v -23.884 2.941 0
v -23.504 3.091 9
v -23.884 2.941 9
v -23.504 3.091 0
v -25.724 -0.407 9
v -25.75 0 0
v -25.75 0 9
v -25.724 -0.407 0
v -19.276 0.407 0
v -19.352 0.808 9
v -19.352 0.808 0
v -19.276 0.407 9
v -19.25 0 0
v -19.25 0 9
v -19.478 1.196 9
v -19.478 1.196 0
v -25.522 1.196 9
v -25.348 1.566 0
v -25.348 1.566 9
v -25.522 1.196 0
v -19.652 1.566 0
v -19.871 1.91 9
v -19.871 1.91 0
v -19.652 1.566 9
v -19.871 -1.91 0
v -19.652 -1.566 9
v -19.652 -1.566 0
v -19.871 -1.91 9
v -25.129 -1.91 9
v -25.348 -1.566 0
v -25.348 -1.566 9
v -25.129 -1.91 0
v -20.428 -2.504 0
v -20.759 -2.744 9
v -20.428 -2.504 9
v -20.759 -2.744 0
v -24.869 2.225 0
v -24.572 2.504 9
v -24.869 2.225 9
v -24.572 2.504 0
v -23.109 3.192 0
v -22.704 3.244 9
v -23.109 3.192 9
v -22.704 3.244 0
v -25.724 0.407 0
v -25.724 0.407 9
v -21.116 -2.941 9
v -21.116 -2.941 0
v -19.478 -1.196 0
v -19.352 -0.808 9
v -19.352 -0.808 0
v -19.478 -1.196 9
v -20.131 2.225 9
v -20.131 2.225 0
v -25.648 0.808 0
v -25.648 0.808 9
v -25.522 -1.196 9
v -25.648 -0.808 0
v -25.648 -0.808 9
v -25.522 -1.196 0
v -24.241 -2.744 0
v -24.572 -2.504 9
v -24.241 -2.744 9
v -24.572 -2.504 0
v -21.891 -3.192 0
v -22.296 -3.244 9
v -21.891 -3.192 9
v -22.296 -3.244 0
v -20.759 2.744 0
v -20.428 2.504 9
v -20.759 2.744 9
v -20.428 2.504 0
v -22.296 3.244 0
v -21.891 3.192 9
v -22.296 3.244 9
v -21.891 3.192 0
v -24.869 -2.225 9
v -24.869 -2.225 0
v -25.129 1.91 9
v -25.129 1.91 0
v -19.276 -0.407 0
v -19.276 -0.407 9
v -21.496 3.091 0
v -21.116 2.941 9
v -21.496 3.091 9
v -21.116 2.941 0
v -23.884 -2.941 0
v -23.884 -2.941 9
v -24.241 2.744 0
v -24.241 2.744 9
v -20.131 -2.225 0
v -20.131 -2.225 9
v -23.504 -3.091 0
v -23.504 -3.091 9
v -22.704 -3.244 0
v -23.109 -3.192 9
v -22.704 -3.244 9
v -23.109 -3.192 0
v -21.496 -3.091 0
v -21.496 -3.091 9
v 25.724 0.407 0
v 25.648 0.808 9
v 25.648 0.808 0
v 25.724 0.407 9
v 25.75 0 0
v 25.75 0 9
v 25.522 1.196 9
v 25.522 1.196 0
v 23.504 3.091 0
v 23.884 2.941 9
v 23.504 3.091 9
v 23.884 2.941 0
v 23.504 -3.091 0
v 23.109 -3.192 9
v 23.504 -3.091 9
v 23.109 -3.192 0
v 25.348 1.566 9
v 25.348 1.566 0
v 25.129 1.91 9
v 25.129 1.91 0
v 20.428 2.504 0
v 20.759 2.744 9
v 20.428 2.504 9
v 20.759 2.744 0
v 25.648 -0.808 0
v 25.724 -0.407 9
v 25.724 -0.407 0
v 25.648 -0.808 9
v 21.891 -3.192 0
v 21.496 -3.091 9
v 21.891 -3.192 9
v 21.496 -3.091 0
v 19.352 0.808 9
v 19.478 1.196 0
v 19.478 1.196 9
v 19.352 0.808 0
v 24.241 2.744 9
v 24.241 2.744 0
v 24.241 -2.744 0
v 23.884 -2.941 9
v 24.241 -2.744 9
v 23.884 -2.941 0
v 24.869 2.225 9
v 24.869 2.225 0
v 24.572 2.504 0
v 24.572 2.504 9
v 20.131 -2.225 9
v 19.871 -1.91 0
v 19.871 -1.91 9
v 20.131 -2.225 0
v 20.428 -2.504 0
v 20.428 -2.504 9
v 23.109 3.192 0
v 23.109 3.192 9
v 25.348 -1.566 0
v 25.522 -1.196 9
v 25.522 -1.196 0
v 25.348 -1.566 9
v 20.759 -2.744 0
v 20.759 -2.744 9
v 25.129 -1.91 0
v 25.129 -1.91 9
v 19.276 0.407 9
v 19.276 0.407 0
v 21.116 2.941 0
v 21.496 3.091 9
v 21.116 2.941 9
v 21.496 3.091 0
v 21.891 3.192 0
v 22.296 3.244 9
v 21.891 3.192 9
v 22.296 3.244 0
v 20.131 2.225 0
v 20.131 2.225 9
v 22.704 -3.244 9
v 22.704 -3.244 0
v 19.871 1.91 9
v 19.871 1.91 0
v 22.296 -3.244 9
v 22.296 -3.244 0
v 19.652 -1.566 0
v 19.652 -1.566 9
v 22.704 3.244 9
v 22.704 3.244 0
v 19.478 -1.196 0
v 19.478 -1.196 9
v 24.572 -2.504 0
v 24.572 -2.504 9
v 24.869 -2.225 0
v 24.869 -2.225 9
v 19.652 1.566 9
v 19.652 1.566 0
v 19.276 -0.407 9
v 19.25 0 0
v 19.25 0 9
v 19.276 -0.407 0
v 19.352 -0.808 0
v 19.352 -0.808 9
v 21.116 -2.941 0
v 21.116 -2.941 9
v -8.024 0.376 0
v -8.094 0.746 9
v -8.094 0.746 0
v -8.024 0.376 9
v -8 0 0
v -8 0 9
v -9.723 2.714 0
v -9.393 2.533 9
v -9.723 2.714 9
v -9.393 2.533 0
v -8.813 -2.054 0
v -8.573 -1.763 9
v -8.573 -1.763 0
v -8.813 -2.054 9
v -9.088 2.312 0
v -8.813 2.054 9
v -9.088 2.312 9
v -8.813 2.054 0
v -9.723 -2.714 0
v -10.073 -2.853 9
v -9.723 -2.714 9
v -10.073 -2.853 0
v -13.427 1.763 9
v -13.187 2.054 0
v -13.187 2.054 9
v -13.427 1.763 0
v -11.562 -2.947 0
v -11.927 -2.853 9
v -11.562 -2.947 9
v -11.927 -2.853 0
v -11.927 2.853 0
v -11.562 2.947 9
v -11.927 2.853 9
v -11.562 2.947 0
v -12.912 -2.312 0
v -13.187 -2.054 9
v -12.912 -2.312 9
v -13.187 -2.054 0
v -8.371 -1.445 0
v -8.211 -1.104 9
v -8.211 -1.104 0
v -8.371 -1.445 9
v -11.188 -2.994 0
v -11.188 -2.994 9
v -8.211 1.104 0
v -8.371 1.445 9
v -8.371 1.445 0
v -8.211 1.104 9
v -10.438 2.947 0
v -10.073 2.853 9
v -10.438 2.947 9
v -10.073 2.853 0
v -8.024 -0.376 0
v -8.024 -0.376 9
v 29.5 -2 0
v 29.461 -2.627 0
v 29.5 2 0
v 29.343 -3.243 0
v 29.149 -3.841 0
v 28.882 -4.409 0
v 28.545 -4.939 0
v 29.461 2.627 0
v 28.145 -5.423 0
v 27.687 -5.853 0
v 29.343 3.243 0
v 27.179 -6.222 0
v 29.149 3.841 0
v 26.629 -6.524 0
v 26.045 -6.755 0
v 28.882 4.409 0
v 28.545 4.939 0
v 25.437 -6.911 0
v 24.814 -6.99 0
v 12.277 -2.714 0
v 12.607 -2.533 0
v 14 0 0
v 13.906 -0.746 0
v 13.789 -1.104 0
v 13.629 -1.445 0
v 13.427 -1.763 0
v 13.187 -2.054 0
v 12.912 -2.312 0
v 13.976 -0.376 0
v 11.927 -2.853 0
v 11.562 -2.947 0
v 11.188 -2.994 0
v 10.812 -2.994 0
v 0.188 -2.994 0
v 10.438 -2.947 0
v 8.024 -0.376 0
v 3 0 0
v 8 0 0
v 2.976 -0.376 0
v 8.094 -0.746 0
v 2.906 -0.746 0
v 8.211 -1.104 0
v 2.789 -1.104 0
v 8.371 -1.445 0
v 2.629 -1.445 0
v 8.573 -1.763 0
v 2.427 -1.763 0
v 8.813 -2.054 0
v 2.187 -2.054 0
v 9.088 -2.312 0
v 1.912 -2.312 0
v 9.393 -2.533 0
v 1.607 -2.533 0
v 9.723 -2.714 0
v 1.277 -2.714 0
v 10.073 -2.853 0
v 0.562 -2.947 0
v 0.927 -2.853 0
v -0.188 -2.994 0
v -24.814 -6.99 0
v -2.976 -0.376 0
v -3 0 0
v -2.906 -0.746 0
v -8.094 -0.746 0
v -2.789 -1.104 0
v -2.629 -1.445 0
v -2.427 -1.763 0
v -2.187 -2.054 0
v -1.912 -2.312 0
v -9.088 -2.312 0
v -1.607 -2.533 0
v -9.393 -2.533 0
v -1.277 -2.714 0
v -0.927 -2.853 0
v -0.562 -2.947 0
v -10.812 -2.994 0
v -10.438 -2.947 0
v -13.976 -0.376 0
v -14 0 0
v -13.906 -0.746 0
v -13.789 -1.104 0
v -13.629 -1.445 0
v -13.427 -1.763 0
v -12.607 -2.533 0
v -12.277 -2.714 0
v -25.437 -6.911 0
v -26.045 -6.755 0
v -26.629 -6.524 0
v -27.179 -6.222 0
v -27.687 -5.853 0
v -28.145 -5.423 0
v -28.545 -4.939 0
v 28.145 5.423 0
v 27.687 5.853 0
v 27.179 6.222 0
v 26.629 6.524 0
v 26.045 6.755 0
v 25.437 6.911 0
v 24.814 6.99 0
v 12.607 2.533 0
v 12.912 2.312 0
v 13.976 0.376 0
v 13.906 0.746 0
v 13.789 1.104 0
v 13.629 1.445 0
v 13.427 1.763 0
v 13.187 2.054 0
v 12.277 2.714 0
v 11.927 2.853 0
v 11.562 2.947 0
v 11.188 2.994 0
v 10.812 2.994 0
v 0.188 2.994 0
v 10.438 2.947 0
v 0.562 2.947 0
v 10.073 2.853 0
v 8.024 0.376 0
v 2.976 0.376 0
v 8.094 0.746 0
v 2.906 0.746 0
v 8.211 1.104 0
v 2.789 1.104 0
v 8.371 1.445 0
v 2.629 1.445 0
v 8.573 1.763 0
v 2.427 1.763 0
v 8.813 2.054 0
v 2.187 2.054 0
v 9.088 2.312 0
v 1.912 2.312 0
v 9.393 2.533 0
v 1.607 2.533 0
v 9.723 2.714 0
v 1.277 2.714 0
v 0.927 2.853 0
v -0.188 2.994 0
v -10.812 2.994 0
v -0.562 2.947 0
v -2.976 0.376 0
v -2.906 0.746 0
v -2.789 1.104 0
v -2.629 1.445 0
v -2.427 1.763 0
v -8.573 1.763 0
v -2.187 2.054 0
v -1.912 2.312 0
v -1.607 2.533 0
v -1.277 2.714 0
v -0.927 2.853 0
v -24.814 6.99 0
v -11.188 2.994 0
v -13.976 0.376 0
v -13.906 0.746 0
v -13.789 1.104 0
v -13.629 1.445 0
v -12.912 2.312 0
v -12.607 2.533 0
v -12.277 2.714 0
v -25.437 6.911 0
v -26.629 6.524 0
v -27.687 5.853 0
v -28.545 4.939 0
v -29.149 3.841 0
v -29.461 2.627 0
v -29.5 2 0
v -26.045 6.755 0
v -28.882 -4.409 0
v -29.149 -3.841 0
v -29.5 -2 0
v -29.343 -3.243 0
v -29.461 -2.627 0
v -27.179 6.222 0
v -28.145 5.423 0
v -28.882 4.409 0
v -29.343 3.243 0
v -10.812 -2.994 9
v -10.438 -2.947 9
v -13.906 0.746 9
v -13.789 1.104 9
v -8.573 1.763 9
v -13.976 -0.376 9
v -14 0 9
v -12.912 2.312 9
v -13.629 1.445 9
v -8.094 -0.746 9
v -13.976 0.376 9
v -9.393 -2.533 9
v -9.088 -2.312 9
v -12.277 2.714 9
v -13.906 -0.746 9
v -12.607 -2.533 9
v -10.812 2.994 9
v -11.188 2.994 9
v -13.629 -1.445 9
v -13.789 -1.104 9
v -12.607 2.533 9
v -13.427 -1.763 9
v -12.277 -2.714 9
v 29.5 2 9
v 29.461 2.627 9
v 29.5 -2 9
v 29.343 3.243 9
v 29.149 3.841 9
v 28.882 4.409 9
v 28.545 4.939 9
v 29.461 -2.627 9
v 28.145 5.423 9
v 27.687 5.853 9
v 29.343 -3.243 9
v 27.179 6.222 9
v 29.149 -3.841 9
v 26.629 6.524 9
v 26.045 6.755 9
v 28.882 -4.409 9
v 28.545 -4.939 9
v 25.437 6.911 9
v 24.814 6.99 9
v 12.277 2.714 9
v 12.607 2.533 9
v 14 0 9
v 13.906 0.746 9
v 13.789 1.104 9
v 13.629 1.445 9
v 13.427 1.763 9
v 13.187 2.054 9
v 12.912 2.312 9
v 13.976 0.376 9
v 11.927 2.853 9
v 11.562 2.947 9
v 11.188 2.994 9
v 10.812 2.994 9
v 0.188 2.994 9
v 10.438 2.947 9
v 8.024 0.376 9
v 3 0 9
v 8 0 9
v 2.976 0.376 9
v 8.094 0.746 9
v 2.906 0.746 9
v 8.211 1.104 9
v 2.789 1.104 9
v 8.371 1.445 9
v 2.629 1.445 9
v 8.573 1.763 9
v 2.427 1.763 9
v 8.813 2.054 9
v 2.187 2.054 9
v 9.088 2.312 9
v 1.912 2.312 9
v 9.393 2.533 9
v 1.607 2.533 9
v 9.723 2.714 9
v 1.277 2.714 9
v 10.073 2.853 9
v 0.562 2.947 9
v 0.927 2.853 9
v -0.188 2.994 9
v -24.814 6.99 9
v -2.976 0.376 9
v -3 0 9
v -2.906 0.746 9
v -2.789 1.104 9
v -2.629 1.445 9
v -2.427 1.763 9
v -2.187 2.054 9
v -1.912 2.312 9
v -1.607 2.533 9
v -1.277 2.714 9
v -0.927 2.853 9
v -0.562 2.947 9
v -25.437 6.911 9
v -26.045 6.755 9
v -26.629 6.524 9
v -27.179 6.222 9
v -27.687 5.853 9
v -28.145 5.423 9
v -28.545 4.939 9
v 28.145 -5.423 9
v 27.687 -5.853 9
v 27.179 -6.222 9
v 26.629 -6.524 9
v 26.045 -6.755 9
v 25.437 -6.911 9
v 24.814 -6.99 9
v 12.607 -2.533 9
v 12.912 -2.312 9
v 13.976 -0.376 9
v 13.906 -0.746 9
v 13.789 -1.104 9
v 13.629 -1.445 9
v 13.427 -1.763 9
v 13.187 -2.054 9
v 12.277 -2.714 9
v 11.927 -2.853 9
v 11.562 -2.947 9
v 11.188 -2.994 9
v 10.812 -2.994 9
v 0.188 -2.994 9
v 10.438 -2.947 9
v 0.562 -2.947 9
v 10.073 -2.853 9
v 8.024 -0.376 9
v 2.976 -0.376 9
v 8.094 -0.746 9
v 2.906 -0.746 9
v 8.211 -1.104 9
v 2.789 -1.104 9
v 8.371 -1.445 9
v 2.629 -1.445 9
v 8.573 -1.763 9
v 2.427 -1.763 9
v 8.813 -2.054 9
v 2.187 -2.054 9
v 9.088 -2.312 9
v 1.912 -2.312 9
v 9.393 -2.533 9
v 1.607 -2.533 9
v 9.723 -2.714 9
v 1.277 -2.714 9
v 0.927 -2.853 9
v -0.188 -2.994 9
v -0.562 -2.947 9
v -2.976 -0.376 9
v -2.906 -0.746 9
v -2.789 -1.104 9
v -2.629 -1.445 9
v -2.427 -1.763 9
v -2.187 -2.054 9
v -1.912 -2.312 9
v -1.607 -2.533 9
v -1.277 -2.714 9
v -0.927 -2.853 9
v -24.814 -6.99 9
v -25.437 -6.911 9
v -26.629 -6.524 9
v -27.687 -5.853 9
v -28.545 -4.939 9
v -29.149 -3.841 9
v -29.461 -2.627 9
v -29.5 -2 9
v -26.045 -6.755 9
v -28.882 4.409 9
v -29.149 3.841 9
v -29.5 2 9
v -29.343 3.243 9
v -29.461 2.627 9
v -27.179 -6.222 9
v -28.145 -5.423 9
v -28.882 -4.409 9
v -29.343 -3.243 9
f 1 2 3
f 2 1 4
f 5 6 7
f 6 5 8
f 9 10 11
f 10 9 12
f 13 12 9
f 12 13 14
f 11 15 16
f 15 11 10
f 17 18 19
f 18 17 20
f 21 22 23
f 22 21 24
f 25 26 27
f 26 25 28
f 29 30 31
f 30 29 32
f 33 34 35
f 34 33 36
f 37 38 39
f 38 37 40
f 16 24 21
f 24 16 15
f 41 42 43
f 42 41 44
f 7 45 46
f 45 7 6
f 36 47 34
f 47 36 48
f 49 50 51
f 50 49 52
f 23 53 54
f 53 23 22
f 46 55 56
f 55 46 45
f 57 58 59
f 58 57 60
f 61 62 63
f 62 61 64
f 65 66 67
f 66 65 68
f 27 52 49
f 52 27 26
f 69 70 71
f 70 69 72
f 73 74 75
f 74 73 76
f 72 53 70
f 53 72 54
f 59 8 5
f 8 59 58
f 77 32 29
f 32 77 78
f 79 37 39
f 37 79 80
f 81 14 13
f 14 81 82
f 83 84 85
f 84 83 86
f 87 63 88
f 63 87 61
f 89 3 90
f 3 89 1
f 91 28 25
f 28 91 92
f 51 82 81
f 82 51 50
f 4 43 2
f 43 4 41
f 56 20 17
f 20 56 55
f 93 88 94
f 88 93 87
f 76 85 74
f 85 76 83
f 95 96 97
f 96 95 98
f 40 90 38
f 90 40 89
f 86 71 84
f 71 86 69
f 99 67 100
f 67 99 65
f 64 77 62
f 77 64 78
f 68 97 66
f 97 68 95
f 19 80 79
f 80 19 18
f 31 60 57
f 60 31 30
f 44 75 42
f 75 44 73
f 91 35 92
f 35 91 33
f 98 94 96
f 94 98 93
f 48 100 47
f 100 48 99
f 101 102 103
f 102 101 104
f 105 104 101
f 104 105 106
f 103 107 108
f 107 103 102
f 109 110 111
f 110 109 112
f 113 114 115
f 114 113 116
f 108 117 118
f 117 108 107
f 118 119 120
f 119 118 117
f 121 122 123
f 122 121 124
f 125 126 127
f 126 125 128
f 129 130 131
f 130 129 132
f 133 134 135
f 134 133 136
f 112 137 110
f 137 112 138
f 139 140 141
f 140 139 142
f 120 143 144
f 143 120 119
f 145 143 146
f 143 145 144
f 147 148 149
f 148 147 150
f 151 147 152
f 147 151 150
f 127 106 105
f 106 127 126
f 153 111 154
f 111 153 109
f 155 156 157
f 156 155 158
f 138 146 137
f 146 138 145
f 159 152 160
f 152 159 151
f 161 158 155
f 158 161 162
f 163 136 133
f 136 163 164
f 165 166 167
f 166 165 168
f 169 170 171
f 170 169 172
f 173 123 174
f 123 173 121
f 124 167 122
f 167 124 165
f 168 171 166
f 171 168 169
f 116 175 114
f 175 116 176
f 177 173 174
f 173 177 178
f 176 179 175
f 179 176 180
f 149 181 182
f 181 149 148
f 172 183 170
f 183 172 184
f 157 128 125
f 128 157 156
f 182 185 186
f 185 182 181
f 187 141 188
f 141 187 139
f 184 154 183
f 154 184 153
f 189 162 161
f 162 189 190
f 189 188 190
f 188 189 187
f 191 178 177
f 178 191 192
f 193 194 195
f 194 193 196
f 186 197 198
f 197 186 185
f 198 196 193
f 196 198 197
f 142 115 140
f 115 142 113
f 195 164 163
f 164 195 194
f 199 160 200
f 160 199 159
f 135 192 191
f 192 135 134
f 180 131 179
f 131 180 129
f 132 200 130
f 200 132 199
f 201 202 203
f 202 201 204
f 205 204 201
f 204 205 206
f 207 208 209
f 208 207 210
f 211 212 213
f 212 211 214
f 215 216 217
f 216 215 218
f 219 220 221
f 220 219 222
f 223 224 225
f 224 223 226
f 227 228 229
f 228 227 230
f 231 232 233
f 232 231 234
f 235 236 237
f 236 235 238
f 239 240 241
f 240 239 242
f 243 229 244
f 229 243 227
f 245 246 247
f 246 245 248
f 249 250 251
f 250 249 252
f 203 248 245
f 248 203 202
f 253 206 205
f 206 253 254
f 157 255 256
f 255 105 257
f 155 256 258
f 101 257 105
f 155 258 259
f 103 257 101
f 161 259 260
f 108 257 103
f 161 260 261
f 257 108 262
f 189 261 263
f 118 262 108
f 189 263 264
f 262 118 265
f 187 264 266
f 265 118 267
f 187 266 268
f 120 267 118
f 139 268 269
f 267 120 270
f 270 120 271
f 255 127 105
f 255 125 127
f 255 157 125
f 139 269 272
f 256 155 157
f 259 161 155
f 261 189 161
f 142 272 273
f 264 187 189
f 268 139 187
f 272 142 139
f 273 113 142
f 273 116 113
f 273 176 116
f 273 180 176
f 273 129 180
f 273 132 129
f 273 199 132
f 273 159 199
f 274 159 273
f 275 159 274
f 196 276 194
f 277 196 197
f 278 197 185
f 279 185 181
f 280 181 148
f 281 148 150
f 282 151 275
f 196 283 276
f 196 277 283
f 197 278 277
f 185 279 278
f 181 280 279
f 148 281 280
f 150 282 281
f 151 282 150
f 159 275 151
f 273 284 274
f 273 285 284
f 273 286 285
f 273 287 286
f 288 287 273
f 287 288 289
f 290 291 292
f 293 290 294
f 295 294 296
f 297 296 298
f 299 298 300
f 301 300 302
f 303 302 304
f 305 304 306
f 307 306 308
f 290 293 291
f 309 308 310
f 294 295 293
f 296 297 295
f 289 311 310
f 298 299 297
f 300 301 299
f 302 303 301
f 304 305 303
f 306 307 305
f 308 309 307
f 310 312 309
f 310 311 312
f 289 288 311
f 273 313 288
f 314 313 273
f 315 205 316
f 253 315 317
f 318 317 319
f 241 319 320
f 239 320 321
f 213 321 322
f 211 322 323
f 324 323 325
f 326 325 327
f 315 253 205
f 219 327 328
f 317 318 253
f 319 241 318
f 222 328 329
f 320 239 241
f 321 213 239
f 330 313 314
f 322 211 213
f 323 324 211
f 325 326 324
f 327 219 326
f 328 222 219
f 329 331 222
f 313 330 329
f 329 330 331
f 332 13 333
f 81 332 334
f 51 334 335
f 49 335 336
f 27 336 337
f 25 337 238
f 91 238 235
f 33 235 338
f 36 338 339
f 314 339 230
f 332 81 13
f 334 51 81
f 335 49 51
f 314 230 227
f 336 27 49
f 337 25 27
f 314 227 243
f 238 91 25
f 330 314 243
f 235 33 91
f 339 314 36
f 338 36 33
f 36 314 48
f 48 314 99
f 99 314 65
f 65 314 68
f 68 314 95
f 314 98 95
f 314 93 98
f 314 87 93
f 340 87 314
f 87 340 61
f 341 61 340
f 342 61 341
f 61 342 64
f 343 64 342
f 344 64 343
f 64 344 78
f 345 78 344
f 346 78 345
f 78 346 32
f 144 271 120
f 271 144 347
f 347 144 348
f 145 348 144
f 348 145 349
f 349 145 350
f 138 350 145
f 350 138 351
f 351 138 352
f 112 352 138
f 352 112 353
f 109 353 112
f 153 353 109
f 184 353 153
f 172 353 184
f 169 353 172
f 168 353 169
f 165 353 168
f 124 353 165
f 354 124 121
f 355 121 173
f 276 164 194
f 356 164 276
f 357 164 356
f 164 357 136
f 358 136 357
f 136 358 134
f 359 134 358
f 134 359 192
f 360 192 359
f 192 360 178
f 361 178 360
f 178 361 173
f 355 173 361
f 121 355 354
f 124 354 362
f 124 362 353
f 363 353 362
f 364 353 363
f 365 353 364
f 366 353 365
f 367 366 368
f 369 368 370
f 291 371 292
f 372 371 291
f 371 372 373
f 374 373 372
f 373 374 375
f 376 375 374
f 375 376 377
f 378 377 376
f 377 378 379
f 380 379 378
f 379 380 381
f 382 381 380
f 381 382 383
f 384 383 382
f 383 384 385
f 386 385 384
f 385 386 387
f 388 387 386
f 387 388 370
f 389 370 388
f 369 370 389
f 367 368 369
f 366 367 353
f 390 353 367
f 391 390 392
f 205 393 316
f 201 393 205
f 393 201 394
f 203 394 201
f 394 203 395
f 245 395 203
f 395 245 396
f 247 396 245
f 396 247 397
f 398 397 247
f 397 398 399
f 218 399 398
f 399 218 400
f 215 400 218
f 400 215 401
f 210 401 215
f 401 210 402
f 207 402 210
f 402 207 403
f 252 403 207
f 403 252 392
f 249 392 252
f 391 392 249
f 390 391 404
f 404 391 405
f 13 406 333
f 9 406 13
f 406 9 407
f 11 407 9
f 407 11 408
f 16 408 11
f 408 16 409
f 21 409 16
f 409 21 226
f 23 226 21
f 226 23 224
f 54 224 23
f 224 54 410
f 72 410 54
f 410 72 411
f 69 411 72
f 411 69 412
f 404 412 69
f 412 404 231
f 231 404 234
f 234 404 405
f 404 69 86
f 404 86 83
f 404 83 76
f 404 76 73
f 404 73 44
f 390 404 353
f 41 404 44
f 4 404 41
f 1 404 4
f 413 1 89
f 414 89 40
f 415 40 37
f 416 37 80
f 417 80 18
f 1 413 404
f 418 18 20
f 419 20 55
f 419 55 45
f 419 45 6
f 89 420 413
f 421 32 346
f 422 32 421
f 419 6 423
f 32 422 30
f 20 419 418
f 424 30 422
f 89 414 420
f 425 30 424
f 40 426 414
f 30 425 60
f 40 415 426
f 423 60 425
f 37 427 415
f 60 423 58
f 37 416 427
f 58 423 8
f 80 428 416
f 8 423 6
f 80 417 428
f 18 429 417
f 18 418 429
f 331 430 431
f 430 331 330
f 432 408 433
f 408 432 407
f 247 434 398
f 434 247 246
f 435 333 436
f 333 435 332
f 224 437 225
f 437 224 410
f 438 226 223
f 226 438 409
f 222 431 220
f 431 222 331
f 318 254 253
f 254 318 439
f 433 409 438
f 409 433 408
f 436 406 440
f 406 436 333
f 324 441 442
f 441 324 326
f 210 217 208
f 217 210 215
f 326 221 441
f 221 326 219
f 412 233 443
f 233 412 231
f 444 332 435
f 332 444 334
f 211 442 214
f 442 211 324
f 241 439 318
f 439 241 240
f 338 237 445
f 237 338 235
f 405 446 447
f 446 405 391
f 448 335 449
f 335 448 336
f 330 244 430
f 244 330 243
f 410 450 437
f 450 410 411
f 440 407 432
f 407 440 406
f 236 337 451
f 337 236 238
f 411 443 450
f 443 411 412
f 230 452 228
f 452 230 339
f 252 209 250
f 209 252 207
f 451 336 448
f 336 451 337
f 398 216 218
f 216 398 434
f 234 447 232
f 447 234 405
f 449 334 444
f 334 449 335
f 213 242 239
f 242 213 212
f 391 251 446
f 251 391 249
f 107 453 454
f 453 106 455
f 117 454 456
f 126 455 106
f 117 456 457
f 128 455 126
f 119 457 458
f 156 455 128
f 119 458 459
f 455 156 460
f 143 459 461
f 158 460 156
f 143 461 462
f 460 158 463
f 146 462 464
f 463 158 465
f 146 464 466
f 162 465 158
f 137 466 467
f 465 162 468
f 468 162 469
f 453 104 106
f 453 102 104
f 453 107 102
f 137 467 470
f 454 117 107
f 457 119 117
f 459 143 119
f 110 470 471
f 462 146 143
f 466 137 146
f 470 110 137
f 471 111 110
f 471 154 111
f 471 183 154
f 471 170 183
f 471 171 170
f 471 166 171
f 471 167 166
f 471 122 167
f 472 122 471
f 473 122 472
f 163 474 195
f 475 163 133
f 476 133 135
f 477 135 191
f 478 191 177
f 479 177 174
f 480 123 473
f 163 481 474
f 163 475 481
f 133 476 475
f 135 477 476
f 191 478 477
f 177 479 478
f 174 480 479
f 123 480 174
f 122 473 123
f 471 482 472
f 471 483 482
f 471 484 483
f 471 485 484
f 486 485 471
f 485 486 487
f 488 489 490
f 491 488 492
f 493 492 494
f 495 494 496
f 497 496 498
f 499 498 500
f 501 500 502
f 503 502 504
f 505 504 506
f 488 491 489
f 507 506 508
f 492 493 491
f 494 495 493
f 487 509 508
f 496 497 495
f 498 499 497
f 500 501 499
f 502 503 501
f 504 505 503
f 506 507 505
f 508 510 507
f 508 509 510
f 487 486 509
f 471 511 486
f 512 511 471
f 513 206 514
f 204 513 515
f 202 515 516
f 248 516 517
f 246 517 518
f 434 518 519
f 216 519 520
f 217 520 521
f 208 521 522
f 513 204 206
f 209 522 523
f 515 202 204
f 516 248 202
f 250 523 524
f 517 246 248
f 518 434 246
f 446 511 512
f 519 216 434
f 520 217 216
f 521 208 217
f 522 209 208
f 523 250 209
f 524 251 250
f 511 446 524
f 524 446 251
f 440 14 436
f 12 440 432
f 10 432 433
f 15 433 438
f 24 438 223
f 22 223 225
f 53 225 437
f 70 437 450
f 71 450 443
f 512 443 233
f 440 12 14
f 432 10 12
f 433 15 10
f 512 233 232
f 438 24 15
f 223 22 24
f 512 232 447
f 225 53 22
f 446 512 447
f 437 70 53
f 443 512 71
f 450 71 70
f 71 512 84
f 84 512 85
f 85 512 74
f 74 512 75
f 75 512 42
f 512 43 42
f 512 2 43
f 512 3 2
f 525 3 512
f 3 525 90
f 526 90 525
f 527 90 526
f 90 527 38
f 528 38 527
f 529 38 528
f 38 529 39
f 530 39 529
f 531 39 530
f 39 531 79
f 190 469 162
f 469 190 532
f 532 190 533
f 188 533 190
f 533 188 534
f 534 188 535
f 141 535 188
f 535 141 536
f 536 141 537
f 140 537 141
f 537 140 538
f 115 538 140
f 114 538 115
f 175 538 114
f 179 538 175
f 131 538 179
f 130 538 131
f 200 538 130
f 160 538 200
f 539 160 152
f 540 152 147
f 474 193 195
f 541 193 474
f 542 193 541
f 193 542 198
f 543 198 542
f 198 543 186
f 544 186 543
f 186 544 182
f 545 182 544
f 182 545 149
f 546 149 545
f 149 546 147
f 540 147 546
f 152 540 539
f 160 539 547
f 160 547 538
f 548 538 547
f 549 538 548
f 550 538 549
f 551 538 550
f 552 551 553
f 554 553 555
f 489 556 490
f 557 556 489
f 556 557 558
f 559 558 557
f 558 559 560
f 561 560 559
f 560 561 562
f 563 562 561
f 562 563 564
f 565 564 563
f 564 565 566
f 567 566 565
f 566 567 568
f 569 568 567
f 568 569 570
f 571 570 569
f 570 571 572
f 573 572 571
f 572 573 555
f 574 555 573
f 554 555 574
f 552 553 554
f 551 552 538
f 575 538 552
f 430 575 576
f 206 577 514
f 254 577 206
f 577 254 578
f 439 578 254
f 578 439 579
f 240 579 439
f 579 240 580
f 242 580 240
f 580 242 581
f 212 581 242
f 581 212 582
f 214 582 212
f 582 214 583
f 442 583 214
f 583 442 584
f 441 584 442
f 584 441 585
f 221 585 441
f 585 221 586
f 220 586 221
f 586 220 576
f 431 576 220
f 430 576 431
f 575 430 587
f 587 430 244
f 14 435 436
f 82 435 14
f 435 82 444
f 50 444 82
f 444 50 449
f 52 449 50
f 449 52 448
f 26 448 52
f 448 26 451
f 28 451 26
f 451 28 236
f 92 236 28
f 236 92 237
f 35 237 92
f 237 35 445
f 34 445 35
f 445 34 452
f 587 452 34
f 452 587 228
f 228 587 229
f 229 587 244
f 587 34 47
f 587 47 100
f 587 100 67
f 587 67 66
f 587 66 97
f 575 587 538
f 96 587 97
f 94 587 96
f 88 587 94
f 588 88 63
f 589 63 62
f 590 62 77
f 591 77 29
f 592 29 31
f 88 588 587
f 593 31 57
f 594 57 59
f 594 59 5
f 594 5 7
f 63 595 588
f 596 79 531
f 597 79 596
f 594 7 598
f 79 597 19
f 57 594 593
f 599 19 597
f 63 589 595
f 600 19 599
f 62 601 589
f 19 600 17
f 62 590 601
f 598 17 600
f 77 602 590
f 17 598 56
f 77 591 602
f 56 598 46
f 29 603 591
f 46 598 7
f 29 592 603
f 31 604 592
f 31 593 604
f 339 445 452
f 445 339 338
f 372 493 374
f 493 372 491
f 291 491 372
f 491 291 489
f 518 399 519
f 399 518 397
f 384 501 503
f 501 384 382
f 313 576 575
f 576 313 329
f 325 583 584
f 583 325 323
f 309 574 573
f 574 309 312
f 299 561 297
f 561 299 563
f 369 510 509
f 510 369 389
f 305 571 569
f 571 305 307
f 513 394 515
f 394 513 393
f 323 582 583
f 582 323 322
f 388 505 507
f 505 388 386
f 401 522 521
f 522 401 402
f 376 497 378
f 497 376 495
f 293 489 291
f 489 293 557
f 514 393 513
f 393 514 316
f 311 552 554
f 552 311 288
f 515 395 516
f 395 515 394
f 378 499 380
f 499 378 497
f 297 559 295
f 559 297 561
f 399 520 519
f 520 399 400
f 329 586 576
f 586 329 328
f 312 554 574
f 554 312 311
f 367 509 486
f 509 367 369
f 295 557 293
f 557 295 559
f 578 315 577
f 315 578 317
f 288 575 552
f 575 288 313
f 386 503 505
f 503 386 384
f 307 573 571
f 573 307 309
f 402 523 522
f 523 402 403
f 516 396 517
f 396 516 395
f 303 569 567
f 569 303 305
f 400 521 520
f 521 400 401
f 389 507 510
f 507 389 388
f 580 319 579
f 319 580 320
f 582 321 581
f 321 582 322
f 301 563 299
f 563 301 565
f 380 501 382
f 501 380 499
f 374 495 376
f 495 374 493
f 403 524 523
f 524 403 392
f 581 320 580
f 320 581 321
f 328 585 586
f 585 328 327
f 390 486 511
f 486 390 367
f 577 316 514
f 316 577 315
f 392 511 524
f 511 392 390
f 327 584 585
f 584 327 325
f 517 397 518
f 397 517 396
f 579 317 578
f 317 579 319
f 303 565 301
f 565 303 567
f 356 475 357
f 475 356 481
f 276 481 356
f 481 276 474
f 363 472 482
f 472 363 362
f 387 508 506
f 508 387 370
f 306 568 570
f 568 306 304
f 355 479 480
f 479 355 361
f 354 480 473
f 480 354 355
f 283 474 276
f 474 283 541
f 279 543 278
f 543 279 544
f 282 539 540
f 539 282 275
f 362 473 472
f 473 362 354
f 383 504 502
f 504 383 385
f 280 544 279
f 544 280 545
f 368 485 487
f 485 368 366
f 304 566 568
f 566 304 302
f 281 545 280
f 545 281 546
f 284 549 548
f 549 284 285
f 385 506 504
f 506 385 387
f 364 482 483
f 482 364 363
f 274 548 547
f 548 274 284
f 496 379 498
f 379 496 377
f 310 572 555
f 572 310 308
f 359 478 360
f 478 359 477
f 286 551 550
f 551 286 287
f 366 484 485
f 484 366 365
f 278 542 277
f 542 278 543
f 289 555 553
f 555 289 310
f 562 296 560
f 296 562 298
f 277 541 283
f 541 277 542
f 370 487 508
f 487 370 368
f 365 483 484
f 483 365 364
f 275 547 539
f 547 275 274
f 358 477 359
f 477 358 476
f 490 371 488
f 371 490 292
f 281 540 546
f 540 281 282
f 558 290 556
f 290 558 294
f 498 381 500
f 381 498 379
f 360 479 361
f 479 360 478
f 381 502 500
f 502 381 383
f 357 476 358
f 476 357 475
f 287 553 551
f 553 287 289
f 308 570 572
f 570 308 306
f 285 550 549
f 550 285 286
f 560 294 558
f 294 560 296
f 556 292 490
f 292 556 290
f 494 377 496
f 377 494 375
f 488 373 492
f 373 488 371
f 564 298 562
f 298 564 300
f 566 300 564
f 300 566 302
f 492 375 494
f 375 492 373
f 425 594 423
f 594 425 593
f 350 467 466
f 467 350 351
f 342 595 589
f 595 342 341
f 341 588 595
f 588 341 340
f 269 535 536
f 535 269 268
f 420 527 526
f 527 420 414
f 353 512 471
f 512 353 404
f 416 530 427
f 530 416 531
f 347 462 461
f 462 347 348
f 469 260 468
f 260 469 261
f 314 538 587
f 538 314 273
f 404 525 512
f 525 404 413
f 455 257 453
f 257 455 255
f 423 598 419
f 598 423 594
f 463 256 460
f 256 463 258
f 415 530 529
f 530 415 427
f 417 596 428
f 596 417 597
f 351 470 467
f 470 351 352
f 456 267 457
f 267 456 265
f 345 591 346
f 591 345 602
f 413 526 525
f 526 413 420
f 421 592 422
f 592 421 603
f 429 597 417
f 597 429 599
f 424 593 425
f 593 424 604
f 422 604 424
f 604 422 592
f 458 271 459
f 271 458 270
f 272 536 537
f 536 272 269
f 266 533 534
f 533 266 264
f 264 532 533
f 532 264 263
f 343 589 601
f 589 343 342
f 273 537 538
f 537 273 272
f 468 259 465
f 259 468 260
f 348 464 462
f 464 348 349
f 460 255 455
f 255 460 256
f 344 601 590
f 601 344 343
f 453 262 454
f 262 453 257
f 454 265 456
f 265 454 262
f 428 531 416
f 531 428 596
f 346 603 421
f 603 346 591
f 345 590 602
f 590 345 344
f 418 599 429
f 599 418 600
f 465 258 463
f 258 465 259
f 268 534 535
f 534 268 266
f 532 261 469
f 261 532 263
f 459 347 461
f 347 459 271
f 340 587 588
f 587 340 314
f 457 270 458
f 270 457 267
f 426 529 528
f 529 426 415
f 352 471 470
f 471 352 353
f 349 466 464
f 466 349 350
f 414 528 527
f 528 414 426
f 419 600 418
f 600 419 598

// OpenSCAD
$fn = 50;


difference() {
	union() {
		hull() {
			translate(v = [-24.5000000000, 2.0000000000, 0]) {
				cylinder(h = 9, r = 5);
			}
			translate(v = [24.5000000000, 2.0000000000, 0]) {
				cylinder(h = 9, r = 5);
			}
			translate(v = [-24.5000000000, -2.0000000000, 0]) {
				cylinder(h = 9, r = 5);
			}
			translate(v = [24.5000000000, -2.0000000000, 0]) {
				cylinder(h = 9, r = 5);
			}
		}
	}
	union() {
		#translate(v = [-22.5000000000, 0.0000000000, 0]) {
			cylinder(h = 9, r = 3.2500000000);
		}
		#translate(v = [22.5000000000, 0.0000000000, 0]) {
			cylinder(h = 9, r = 3.2500000000);
		}
		#translate(v = [-22.5000000000, 0.0000000000, -100.0000000000]) {
			cylinder(h = 200, r = 3.2500000000);
		}
		#translate(v = [-22.5000000000, 0.0000000000, -100.0000000000]) {
			cylinder(h = 200, r = 3.2500000000);
		}
		#translate(v = [22.5000000000, 0.0000000000, -100.0000000000]) {
			cylinder(h = 200, r = 3.2500000000);
		}
		#translate(v = [22.5000000000, 0.0000000000, -100.0000000000]) {
			cylinder(h = 200, r = 3.2500000000);
		}
		#translate(v = [-22.5000000000, 0.0000000000, 0]) {
			cylinder(h = 9, r = 1.8000000000);
		}
		#translate(v = [22.5000000000, 0.0000000000, 0]) {
			cylinder(h = 9, r = 1.8000000000);
		}
		#translate(v = [-22.5000000000, 0.0000000000, 0]) {
			cylinder(h = 9, r = 1.8000000000);
		}
		#translate(v = [22.5000000000, 0.0000000000, 0]) {
			cylinder(h = 9, r = 1.8000000000);
		}
		#translate(v = [-22.5000000000, 0.0000000000, 0]) {
			cylinder(h = 9, r = 1.8000000000);
		}
		#translate(v = [22.5000000000, 0.0000000000, 0]) {
			cylinder(h = 9, r = 1.8000000000);
		}
		#translate(v = [-11.0000000000, 0, 0]) {
			cylinder(h = 9, r = 3.0000000000);
		}
		#cylinder(h = 9, r = 3.0000000000);
		#translate(v = [11.0000000000, 0, 0]) {
			cylinder(h = 9, r = 3.0000000000);
		}
	}
}
